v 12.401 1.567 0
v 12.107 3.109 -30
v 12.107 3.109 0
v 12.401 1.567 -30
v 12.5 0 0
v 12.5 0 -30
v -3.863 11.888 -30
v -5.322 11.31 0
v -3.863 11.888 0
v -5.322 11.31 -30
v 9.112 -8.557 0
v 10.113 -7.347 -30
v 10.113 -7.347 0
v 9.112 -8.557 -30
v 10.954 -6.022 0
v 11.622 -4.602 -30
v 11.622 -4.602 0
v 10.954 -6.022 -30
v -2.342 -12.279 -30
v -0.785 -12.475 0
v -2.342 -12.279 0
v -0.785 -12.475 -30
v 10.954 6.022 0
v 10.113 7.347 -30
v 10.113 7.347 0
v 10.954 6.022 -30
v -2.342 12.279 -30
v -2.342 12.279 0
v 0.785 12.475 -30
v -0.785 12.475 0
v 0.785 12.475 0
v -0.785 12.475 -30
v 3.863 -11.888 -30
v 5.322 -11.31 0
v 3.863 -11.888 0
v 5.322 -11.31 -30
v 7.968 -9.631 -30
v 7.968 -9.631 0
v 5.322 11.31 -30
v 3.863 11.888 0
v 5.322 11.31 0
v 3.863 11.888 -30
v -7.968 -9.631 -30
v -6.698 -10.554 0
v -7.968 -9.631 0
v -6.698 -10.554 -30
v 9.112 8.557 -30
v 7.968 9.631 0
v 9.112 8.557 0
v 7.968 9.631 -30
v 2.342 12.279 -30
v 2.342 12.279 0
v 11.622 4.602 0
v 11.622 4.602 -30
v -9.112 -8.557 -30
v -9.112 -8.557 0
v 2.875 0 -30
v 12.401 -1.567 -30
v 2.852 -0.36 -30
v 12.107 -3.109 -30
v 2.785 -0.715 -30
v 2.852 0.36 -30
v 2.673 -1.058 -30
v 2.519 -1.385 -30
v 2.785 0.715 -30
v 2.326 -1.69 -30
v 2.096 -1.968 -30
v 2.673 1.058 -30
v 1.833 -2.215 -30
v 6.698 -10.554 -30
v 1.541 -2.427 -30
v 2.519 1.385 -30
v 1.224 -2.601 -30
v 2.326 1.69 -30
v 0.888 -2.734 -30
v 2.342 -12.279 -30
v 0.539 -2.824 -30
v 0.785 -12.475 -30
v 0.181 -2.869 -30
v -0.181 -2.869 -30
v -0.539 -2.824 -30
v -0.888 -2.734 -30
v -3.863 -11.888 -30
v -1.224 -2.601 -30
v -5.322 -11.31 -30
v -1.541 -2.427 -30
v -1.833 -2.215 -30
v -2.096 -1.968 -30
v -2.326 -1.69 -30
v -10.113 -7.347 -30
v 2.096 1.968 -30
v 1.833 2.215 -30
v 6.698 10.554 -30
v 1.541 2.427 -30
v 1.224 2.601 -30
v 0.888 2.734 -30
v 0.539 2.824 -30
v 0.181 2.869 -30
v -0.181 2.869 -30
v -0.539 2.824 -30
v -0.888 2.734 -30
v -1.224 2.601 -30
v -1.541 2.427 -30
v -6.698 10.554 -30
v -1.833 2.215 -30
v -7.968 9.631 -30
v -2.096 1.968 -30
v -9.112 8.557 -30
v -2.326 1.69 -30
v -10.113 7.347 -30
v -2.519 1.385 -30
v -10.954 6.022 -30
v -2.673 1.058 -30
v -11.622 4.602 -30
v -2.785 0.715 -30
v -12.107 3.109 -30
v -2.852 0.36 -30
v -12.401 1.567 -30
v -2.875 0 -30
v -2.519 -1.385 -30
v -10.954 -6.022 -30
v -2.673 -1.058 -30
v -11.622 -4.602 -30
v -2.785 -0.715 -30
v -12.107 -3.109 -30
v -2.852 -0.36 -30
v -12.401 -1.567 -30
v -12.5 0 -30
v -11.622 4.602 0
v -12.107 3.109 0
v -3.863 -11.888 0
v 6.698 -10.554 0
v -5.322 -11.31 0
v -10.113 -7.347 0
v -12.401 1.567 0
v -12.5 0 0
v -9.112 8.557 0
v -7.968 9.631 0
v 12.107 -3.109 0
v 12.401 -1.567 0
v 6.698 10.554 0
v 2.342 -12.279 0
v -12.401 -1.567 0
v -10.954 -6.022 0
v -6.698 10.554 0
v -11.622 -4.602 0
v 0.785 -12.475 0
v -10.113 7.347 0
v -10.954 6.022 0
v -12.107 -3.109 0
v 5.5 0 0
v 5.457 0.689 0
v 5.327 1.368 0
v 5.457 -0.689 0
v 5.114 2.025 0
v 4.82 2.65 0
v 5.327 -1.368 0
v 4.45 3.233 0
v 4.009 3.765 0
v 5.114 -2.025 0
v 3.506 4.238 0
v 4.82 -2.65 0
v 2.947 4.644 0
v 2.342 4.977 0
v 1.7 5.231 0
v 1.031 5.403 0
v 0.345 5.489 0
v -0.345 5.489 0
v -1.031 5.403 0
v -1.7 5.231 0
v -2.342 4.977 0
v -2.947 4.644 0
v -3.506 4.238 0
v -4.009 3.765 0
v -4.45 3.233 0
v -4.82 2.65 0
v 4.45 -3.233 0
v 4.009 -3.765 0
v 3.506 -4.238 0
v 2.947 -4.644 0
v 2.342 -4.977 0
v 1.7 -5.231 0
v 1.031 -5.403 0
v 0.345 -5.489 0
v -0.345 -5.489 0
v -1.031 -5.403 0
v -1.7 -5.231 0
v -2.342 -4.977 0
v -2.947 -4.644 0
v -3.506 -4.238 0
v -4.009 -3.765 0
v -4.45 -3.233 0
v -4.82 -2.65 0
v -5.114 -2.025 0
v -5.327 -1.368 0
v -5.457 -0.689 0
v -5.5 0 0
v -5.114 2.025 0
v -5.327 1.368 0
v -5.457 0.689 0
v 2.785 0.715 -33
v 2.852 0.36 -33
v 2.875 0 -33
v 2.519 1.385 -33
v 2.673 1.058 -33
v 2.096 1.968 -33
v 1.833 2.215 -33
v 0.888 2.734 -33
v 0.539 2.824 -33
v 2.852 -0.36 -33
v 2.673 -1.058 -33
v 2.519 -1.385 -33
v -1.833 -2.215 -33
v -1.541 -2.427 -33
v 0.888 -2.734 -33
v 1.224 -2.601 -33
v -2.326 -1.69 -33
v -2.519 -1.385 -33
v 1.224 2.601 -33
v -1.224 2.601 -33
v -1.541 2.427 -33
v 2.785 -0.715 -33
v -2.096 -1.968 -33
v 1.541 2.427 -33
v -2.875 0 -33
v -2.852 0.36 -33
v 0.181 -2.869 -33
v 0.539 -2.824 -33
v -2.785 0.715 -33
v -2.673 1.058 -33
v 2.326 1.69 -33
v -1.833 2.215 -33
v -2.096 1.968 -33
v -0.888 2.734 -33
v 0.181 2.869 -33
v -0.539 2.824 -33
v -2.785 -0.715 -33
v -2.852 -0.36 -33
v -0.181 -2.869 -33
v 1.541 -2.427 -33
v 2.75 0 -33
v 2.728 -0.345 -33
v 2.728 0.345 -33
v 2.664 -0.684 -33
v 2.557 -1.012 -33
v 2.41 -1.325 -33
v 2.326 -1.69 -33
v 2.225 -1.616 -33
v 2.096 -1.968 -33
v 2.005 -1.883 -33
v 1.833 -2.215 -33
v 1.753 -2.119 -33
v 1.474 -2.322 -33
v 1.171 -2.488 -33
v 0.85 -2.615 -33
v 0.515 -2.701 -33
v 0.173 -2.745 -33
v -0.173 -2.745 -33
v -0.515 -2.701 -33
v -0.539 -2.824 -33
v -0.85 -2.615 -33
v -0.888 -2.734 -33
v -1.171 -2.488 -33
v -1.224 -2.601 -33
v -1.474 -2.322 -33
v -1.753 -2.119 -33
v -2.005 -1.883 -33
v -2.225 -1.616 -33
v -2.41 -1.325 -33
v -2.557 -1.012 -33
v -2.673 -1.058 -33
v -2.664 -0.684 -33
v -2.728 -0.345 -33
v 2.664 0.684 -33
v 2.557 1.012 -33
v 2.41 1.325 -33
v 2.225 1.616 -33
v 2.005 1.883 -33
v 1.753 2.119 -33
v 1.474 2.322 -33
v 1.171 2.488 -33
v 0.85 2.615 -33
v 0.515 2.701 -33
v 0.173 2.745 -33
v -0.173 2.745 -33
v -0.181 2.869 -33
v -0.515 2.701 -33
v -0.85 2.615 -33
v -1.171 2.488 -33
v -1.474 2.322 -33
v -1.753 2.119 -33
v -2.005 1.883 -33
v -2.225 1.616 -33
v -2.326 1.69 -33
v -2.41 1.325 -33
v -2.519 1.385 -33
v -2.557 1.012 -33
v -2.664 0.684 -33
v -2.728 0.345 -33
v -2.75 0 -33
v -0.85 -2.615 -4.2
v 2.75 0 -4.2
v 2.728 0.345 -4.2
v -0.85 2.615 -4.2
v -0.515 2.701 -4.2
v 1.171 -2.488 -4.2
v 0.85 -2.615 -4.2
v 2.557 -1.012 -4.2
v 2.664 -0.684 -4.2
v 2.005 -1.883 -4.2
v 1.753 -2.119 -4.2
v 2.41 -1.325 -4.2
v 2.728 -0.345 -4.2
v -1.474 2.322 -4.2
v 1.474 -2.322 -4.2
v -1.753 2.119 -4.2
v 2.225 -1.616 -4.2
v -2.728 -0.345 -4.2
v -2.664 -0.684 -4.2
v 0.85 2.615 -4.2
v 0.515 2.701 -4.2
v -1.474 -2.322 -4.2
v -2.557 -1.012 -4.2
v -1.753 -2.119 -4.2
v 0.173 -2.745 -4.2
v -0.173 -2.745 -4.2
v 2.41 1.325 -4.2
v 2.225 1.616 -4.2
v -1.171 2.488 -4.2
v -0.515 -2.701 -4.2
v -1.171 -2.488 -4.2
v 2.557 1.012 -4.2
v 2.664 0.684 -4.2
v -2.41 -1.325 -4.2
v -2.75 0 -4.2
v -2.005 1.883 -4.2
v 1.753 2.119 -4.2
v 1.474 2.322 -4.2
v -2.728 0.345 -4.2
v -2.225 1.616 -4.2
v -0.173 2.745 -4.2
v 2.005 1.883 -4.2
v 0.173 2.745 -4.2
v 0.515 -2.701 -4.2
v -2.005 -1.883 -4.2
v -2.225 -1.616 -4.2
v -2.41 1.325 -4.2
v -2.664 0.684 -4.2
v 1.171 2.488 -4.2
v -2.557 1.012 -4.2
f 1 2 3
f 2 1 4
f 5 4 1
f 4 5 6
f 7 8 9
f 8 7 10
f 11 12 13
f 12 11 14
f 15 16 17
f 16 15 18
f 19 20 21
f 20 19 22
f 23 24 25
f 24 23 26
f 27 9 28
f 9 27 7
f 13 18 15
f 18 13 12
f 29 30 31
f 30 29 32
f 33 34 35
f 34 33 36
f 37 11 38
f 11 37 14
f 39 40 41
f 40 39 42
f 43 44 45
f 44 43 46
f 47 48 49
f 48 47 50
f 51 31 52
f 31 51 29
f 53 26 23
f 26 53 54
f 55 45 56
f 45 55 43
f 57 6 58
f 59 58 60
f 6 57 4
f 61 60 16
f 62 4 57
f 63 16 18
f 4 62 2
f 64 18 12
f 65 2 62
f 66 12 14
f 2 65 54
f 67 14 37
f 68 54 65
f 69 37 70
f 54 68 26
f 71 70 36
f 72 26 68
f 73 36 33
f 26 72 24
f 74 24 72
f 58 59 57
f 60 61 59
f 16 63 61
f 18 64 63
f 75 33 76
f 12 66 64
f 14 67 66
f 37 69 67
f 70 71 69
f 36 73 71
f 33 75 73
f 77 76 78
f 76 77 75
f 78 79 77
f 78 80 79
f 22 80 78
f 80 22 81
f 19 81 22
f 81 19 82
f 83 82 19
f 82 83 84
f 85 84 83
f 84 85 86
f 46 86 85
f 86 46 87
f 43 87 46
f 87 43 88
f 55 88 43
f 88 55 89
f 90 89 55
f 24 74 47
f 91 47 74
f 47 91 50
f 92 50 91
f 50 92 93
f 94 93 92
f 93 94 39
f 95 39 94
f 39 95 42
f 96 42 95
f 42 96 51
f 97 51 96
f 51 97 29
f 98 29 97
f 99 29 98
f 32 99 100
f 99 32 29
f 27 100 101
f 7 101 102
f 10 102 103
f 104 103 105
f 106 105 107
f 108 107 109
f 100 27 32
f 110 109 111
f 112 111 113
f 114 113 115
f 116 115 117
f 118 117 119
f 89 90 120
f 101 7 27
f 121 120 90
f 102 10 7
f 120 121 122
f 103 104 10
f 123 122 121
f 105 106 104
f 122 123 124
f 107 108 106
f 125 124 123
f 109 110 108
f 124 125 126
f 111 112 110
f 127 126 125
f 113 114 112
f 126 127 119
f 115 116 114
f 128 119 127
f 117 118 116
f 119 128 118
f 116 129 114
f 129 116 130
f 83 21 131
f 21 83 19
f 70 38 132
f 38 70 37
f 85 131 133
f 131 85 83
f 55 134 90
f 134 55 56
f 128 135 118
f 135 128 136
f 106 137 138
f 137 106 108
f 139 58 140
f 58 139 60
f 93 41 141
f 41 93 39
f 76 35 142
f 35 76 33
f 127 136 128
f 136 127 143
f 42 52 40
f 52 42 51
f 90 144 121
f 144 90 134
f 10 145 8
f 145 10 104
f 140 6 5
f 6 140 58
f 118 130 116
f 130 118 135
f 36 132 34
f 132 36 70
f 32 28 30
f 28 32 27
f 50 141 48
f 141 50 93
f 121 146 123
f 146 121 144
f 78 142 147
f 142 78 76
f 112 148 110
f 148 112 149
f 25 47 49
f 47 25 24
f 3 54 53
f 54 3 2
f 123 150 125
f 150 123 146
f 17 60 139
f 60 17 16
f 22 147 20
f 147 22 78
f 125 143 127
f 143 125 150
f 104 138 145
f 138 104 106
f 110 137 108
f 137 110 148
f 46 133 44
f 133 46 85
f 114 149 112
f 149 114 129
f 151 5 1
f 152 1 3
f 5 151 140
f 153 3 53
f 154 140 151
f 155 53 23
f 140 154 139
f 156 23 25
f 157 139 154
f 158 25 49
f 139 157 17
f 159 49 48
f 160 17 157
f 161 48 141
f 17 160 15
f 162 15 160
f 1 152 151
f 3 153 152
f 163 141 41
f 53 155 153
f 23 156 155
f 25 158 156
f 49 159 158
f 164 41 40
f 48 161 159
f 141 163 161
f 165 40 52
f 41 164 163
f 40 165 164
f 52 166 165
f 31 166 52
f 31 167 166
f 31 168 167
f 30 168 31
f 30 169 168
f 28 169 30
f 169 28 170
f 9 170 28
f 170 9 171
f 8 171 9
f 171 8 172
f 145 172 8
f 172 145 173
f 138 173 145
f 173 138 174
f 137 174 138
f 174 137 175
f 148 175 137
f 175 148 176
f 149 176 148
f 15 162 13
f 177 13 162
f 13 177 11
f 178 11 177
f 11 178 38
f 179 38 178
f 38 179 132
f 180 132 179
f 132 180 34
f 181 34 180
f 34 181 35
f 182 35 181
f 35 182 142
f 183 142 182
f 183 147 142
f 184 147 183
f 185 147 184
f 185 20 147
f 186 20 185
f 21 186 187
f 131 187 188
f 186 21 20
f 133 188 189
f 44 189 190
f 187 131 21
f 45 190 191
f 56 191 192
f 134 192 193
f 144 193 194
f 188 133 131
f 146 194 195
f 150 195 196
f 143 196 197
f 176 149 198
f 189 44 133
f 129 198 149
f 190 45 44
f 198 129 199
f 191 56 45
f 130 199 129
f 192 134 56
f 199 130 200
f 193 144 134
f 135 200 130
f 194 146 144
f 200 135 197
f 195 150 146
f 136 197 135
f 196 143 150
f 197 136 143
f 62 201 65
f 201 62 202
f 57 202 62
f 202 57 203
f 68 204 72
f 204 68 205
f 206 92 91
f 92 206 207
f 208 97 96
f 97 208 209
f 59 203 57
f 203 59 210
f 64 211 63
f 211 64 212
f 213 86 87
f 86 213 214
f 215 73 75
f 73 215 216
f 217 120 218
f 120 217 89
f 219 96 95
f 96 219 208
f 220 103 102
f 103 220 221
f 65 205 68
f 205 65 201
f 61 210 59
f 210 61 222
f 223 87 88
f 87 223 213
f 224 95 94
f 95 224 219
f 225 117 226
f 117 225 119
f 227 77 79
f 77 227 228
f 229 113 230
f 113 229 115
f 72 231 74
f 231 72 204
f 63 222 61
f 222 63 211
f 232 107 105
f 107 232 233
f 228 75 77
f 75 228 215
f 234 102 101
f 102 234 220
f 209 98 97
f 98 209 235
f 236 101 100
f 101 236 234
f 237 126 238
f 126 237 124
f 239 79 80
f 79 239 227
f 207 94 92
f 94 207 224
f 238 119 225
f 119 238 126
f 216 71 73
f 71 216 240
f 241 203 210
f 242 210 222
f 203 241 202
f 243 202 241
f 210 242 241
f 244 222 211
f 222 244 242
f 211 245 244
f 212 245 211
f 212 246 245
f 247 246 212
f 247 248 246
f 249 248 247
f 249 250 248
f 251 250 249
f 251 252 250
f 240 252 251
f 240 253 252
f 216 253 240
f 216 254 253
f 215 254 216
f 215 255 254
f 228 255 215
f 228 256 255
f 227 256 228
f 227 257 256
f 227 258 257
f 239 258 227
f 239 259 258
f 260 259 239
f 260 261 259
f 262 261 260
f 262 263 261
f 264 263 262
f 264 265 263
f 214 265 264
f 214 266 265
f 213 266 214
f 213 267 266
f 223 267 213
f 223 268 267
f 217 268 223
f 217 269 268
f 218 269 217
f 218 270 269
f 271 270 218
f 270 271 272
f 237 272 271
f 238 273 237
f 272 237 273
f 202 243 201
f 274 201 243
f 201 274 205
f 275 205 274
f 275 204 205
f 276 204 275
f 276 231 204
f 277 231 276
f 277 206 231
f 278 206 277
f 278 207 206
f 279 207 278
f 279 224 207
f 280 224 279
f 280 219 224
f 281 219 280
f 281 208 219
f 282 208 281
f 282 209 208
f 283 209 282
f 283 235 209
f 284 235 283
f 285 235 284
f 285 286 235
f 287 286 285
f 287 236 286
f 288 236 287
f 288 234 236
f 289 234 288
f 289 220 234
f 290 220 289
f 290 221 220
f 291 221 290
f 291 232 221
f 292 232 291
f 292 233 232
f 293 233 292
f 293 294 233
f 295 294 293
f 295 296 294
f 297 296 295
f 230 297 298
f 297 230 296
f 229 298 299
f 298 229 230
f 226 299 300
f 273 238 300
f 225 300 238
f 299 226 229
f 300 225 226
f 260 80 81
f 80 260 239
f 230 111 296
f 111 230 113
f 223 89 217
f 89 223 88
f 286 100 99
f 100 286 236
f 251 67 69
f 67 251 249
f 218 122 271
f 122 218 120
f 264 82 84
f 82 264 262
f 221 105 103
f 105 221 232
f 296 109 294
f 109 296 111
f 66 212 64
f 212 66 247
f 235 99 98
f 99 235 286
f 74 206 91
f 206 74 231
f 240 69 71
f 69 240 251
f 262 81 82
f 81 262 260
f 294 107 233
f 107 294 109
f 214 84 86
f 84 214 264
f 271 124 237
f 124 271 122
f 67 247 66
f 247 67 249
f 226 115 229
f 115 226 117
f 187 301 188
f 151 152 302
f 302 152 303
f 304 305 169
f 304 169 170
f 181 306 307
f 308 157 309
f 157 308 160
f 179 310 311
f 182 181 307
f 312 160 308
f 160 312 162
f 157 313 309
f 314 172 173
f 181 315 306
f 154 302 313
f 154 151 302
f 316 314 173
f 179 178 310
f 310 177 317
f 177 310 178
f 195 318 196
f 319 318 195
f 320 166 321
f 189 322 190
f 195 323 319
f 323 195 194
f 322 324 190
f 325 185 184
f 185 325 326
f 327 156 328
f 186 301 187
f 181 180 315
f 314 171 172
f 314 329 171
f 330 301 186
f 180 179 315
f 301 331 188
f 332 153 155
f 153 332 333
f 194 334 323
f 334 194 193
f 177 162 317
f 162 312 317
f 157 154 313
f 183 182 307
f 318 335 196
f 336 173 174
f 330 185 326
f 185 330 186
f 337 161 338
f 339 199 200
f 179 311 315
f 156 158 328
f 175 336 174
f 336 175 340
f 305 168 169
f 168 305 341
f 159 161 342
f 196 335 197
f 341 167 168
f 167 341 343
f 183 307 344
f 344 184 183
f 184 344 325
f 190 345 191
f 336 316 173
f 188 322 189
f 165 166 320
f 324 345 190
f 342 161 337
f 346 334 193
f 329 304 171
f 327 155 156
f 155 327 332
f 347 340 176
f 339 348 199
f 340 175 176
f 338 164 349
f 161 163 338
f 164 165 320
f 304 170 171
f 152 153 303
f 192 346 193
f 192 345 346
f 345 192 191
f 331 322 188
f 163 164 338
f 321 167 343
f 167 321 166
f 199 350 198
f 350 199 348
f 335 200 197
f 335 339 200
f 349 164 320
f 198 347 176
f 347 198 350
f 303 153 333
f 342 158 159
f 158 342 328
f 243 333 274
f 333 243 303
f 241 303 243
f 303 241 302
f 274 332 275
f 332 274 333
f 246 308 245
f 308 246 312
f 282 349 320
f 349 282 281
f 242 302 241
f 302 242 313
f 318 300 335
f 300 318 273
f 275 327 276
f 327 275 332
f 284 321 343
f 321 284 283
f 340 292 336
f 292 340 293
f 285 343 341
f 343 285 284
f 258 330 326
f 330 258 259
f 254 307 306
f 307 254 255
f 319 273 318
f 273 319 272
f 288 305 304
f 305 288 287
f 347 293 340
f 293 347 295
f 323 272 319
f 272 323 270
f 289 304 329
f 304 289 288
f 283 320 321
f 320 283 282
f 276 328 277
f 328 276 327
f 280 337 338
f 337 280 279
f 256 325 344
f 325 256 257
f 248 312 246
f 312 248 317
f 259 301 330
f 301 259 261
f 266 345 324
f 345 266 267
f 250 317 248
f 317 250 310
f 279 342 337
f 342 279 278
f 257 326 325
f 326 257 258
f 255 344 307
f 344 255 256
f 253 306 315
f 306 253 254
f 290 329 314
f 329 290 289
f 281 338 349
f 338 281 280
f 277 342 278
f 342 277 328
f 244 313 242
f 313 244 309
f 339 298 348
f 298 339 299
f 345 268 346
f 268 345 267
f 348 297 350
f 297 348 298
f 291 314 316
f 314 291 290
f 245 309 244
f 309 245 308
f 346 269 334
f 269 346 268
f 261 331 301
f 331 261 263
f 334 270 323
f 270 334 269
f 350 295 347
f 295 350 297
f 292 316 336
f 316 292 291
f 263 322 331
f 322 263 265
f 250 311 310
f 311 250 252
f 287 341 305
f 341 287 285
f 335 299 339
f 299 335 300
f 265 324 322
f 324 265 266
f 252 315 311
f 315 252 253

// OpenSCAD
$fn = 50;


difference() {
	union() {
		translate(v = [0, 0, -30.0000000000]) {
			cylinder(h = 30, r = 12.5000000000);
		}
		#translate(v = [0, 0, -33.0000000000]) {
			cylinder(h = 33, r = 2.8750000000);
		}
	}
	union() {
		translate(v = [0, 0, 0]) {
			rotate(a = [0, 0, 0]) {
				difference() {
					union() {
						translate(v = [0, 0, -33.0000000000]) {
							cylinder(h = 33, r = 2.2500000000);
						}
						translate(v = [0, 0, -4.2000000000]) {
							cylinder(h = 4.2000000000, r1 = 2.7500000000, r2 = 5.5000000000);
						}
						translate(v = [0, 0, -33.0000000000]) {
							cylinder(h = 33, r = 2.7500000000);
						}
						translate(v = [0, 0, -33.0000000000]) {
							cylinder(h = 33, r = 2.2500000000);
						}
					}
					union();
				}
			}
		}
	}
}
